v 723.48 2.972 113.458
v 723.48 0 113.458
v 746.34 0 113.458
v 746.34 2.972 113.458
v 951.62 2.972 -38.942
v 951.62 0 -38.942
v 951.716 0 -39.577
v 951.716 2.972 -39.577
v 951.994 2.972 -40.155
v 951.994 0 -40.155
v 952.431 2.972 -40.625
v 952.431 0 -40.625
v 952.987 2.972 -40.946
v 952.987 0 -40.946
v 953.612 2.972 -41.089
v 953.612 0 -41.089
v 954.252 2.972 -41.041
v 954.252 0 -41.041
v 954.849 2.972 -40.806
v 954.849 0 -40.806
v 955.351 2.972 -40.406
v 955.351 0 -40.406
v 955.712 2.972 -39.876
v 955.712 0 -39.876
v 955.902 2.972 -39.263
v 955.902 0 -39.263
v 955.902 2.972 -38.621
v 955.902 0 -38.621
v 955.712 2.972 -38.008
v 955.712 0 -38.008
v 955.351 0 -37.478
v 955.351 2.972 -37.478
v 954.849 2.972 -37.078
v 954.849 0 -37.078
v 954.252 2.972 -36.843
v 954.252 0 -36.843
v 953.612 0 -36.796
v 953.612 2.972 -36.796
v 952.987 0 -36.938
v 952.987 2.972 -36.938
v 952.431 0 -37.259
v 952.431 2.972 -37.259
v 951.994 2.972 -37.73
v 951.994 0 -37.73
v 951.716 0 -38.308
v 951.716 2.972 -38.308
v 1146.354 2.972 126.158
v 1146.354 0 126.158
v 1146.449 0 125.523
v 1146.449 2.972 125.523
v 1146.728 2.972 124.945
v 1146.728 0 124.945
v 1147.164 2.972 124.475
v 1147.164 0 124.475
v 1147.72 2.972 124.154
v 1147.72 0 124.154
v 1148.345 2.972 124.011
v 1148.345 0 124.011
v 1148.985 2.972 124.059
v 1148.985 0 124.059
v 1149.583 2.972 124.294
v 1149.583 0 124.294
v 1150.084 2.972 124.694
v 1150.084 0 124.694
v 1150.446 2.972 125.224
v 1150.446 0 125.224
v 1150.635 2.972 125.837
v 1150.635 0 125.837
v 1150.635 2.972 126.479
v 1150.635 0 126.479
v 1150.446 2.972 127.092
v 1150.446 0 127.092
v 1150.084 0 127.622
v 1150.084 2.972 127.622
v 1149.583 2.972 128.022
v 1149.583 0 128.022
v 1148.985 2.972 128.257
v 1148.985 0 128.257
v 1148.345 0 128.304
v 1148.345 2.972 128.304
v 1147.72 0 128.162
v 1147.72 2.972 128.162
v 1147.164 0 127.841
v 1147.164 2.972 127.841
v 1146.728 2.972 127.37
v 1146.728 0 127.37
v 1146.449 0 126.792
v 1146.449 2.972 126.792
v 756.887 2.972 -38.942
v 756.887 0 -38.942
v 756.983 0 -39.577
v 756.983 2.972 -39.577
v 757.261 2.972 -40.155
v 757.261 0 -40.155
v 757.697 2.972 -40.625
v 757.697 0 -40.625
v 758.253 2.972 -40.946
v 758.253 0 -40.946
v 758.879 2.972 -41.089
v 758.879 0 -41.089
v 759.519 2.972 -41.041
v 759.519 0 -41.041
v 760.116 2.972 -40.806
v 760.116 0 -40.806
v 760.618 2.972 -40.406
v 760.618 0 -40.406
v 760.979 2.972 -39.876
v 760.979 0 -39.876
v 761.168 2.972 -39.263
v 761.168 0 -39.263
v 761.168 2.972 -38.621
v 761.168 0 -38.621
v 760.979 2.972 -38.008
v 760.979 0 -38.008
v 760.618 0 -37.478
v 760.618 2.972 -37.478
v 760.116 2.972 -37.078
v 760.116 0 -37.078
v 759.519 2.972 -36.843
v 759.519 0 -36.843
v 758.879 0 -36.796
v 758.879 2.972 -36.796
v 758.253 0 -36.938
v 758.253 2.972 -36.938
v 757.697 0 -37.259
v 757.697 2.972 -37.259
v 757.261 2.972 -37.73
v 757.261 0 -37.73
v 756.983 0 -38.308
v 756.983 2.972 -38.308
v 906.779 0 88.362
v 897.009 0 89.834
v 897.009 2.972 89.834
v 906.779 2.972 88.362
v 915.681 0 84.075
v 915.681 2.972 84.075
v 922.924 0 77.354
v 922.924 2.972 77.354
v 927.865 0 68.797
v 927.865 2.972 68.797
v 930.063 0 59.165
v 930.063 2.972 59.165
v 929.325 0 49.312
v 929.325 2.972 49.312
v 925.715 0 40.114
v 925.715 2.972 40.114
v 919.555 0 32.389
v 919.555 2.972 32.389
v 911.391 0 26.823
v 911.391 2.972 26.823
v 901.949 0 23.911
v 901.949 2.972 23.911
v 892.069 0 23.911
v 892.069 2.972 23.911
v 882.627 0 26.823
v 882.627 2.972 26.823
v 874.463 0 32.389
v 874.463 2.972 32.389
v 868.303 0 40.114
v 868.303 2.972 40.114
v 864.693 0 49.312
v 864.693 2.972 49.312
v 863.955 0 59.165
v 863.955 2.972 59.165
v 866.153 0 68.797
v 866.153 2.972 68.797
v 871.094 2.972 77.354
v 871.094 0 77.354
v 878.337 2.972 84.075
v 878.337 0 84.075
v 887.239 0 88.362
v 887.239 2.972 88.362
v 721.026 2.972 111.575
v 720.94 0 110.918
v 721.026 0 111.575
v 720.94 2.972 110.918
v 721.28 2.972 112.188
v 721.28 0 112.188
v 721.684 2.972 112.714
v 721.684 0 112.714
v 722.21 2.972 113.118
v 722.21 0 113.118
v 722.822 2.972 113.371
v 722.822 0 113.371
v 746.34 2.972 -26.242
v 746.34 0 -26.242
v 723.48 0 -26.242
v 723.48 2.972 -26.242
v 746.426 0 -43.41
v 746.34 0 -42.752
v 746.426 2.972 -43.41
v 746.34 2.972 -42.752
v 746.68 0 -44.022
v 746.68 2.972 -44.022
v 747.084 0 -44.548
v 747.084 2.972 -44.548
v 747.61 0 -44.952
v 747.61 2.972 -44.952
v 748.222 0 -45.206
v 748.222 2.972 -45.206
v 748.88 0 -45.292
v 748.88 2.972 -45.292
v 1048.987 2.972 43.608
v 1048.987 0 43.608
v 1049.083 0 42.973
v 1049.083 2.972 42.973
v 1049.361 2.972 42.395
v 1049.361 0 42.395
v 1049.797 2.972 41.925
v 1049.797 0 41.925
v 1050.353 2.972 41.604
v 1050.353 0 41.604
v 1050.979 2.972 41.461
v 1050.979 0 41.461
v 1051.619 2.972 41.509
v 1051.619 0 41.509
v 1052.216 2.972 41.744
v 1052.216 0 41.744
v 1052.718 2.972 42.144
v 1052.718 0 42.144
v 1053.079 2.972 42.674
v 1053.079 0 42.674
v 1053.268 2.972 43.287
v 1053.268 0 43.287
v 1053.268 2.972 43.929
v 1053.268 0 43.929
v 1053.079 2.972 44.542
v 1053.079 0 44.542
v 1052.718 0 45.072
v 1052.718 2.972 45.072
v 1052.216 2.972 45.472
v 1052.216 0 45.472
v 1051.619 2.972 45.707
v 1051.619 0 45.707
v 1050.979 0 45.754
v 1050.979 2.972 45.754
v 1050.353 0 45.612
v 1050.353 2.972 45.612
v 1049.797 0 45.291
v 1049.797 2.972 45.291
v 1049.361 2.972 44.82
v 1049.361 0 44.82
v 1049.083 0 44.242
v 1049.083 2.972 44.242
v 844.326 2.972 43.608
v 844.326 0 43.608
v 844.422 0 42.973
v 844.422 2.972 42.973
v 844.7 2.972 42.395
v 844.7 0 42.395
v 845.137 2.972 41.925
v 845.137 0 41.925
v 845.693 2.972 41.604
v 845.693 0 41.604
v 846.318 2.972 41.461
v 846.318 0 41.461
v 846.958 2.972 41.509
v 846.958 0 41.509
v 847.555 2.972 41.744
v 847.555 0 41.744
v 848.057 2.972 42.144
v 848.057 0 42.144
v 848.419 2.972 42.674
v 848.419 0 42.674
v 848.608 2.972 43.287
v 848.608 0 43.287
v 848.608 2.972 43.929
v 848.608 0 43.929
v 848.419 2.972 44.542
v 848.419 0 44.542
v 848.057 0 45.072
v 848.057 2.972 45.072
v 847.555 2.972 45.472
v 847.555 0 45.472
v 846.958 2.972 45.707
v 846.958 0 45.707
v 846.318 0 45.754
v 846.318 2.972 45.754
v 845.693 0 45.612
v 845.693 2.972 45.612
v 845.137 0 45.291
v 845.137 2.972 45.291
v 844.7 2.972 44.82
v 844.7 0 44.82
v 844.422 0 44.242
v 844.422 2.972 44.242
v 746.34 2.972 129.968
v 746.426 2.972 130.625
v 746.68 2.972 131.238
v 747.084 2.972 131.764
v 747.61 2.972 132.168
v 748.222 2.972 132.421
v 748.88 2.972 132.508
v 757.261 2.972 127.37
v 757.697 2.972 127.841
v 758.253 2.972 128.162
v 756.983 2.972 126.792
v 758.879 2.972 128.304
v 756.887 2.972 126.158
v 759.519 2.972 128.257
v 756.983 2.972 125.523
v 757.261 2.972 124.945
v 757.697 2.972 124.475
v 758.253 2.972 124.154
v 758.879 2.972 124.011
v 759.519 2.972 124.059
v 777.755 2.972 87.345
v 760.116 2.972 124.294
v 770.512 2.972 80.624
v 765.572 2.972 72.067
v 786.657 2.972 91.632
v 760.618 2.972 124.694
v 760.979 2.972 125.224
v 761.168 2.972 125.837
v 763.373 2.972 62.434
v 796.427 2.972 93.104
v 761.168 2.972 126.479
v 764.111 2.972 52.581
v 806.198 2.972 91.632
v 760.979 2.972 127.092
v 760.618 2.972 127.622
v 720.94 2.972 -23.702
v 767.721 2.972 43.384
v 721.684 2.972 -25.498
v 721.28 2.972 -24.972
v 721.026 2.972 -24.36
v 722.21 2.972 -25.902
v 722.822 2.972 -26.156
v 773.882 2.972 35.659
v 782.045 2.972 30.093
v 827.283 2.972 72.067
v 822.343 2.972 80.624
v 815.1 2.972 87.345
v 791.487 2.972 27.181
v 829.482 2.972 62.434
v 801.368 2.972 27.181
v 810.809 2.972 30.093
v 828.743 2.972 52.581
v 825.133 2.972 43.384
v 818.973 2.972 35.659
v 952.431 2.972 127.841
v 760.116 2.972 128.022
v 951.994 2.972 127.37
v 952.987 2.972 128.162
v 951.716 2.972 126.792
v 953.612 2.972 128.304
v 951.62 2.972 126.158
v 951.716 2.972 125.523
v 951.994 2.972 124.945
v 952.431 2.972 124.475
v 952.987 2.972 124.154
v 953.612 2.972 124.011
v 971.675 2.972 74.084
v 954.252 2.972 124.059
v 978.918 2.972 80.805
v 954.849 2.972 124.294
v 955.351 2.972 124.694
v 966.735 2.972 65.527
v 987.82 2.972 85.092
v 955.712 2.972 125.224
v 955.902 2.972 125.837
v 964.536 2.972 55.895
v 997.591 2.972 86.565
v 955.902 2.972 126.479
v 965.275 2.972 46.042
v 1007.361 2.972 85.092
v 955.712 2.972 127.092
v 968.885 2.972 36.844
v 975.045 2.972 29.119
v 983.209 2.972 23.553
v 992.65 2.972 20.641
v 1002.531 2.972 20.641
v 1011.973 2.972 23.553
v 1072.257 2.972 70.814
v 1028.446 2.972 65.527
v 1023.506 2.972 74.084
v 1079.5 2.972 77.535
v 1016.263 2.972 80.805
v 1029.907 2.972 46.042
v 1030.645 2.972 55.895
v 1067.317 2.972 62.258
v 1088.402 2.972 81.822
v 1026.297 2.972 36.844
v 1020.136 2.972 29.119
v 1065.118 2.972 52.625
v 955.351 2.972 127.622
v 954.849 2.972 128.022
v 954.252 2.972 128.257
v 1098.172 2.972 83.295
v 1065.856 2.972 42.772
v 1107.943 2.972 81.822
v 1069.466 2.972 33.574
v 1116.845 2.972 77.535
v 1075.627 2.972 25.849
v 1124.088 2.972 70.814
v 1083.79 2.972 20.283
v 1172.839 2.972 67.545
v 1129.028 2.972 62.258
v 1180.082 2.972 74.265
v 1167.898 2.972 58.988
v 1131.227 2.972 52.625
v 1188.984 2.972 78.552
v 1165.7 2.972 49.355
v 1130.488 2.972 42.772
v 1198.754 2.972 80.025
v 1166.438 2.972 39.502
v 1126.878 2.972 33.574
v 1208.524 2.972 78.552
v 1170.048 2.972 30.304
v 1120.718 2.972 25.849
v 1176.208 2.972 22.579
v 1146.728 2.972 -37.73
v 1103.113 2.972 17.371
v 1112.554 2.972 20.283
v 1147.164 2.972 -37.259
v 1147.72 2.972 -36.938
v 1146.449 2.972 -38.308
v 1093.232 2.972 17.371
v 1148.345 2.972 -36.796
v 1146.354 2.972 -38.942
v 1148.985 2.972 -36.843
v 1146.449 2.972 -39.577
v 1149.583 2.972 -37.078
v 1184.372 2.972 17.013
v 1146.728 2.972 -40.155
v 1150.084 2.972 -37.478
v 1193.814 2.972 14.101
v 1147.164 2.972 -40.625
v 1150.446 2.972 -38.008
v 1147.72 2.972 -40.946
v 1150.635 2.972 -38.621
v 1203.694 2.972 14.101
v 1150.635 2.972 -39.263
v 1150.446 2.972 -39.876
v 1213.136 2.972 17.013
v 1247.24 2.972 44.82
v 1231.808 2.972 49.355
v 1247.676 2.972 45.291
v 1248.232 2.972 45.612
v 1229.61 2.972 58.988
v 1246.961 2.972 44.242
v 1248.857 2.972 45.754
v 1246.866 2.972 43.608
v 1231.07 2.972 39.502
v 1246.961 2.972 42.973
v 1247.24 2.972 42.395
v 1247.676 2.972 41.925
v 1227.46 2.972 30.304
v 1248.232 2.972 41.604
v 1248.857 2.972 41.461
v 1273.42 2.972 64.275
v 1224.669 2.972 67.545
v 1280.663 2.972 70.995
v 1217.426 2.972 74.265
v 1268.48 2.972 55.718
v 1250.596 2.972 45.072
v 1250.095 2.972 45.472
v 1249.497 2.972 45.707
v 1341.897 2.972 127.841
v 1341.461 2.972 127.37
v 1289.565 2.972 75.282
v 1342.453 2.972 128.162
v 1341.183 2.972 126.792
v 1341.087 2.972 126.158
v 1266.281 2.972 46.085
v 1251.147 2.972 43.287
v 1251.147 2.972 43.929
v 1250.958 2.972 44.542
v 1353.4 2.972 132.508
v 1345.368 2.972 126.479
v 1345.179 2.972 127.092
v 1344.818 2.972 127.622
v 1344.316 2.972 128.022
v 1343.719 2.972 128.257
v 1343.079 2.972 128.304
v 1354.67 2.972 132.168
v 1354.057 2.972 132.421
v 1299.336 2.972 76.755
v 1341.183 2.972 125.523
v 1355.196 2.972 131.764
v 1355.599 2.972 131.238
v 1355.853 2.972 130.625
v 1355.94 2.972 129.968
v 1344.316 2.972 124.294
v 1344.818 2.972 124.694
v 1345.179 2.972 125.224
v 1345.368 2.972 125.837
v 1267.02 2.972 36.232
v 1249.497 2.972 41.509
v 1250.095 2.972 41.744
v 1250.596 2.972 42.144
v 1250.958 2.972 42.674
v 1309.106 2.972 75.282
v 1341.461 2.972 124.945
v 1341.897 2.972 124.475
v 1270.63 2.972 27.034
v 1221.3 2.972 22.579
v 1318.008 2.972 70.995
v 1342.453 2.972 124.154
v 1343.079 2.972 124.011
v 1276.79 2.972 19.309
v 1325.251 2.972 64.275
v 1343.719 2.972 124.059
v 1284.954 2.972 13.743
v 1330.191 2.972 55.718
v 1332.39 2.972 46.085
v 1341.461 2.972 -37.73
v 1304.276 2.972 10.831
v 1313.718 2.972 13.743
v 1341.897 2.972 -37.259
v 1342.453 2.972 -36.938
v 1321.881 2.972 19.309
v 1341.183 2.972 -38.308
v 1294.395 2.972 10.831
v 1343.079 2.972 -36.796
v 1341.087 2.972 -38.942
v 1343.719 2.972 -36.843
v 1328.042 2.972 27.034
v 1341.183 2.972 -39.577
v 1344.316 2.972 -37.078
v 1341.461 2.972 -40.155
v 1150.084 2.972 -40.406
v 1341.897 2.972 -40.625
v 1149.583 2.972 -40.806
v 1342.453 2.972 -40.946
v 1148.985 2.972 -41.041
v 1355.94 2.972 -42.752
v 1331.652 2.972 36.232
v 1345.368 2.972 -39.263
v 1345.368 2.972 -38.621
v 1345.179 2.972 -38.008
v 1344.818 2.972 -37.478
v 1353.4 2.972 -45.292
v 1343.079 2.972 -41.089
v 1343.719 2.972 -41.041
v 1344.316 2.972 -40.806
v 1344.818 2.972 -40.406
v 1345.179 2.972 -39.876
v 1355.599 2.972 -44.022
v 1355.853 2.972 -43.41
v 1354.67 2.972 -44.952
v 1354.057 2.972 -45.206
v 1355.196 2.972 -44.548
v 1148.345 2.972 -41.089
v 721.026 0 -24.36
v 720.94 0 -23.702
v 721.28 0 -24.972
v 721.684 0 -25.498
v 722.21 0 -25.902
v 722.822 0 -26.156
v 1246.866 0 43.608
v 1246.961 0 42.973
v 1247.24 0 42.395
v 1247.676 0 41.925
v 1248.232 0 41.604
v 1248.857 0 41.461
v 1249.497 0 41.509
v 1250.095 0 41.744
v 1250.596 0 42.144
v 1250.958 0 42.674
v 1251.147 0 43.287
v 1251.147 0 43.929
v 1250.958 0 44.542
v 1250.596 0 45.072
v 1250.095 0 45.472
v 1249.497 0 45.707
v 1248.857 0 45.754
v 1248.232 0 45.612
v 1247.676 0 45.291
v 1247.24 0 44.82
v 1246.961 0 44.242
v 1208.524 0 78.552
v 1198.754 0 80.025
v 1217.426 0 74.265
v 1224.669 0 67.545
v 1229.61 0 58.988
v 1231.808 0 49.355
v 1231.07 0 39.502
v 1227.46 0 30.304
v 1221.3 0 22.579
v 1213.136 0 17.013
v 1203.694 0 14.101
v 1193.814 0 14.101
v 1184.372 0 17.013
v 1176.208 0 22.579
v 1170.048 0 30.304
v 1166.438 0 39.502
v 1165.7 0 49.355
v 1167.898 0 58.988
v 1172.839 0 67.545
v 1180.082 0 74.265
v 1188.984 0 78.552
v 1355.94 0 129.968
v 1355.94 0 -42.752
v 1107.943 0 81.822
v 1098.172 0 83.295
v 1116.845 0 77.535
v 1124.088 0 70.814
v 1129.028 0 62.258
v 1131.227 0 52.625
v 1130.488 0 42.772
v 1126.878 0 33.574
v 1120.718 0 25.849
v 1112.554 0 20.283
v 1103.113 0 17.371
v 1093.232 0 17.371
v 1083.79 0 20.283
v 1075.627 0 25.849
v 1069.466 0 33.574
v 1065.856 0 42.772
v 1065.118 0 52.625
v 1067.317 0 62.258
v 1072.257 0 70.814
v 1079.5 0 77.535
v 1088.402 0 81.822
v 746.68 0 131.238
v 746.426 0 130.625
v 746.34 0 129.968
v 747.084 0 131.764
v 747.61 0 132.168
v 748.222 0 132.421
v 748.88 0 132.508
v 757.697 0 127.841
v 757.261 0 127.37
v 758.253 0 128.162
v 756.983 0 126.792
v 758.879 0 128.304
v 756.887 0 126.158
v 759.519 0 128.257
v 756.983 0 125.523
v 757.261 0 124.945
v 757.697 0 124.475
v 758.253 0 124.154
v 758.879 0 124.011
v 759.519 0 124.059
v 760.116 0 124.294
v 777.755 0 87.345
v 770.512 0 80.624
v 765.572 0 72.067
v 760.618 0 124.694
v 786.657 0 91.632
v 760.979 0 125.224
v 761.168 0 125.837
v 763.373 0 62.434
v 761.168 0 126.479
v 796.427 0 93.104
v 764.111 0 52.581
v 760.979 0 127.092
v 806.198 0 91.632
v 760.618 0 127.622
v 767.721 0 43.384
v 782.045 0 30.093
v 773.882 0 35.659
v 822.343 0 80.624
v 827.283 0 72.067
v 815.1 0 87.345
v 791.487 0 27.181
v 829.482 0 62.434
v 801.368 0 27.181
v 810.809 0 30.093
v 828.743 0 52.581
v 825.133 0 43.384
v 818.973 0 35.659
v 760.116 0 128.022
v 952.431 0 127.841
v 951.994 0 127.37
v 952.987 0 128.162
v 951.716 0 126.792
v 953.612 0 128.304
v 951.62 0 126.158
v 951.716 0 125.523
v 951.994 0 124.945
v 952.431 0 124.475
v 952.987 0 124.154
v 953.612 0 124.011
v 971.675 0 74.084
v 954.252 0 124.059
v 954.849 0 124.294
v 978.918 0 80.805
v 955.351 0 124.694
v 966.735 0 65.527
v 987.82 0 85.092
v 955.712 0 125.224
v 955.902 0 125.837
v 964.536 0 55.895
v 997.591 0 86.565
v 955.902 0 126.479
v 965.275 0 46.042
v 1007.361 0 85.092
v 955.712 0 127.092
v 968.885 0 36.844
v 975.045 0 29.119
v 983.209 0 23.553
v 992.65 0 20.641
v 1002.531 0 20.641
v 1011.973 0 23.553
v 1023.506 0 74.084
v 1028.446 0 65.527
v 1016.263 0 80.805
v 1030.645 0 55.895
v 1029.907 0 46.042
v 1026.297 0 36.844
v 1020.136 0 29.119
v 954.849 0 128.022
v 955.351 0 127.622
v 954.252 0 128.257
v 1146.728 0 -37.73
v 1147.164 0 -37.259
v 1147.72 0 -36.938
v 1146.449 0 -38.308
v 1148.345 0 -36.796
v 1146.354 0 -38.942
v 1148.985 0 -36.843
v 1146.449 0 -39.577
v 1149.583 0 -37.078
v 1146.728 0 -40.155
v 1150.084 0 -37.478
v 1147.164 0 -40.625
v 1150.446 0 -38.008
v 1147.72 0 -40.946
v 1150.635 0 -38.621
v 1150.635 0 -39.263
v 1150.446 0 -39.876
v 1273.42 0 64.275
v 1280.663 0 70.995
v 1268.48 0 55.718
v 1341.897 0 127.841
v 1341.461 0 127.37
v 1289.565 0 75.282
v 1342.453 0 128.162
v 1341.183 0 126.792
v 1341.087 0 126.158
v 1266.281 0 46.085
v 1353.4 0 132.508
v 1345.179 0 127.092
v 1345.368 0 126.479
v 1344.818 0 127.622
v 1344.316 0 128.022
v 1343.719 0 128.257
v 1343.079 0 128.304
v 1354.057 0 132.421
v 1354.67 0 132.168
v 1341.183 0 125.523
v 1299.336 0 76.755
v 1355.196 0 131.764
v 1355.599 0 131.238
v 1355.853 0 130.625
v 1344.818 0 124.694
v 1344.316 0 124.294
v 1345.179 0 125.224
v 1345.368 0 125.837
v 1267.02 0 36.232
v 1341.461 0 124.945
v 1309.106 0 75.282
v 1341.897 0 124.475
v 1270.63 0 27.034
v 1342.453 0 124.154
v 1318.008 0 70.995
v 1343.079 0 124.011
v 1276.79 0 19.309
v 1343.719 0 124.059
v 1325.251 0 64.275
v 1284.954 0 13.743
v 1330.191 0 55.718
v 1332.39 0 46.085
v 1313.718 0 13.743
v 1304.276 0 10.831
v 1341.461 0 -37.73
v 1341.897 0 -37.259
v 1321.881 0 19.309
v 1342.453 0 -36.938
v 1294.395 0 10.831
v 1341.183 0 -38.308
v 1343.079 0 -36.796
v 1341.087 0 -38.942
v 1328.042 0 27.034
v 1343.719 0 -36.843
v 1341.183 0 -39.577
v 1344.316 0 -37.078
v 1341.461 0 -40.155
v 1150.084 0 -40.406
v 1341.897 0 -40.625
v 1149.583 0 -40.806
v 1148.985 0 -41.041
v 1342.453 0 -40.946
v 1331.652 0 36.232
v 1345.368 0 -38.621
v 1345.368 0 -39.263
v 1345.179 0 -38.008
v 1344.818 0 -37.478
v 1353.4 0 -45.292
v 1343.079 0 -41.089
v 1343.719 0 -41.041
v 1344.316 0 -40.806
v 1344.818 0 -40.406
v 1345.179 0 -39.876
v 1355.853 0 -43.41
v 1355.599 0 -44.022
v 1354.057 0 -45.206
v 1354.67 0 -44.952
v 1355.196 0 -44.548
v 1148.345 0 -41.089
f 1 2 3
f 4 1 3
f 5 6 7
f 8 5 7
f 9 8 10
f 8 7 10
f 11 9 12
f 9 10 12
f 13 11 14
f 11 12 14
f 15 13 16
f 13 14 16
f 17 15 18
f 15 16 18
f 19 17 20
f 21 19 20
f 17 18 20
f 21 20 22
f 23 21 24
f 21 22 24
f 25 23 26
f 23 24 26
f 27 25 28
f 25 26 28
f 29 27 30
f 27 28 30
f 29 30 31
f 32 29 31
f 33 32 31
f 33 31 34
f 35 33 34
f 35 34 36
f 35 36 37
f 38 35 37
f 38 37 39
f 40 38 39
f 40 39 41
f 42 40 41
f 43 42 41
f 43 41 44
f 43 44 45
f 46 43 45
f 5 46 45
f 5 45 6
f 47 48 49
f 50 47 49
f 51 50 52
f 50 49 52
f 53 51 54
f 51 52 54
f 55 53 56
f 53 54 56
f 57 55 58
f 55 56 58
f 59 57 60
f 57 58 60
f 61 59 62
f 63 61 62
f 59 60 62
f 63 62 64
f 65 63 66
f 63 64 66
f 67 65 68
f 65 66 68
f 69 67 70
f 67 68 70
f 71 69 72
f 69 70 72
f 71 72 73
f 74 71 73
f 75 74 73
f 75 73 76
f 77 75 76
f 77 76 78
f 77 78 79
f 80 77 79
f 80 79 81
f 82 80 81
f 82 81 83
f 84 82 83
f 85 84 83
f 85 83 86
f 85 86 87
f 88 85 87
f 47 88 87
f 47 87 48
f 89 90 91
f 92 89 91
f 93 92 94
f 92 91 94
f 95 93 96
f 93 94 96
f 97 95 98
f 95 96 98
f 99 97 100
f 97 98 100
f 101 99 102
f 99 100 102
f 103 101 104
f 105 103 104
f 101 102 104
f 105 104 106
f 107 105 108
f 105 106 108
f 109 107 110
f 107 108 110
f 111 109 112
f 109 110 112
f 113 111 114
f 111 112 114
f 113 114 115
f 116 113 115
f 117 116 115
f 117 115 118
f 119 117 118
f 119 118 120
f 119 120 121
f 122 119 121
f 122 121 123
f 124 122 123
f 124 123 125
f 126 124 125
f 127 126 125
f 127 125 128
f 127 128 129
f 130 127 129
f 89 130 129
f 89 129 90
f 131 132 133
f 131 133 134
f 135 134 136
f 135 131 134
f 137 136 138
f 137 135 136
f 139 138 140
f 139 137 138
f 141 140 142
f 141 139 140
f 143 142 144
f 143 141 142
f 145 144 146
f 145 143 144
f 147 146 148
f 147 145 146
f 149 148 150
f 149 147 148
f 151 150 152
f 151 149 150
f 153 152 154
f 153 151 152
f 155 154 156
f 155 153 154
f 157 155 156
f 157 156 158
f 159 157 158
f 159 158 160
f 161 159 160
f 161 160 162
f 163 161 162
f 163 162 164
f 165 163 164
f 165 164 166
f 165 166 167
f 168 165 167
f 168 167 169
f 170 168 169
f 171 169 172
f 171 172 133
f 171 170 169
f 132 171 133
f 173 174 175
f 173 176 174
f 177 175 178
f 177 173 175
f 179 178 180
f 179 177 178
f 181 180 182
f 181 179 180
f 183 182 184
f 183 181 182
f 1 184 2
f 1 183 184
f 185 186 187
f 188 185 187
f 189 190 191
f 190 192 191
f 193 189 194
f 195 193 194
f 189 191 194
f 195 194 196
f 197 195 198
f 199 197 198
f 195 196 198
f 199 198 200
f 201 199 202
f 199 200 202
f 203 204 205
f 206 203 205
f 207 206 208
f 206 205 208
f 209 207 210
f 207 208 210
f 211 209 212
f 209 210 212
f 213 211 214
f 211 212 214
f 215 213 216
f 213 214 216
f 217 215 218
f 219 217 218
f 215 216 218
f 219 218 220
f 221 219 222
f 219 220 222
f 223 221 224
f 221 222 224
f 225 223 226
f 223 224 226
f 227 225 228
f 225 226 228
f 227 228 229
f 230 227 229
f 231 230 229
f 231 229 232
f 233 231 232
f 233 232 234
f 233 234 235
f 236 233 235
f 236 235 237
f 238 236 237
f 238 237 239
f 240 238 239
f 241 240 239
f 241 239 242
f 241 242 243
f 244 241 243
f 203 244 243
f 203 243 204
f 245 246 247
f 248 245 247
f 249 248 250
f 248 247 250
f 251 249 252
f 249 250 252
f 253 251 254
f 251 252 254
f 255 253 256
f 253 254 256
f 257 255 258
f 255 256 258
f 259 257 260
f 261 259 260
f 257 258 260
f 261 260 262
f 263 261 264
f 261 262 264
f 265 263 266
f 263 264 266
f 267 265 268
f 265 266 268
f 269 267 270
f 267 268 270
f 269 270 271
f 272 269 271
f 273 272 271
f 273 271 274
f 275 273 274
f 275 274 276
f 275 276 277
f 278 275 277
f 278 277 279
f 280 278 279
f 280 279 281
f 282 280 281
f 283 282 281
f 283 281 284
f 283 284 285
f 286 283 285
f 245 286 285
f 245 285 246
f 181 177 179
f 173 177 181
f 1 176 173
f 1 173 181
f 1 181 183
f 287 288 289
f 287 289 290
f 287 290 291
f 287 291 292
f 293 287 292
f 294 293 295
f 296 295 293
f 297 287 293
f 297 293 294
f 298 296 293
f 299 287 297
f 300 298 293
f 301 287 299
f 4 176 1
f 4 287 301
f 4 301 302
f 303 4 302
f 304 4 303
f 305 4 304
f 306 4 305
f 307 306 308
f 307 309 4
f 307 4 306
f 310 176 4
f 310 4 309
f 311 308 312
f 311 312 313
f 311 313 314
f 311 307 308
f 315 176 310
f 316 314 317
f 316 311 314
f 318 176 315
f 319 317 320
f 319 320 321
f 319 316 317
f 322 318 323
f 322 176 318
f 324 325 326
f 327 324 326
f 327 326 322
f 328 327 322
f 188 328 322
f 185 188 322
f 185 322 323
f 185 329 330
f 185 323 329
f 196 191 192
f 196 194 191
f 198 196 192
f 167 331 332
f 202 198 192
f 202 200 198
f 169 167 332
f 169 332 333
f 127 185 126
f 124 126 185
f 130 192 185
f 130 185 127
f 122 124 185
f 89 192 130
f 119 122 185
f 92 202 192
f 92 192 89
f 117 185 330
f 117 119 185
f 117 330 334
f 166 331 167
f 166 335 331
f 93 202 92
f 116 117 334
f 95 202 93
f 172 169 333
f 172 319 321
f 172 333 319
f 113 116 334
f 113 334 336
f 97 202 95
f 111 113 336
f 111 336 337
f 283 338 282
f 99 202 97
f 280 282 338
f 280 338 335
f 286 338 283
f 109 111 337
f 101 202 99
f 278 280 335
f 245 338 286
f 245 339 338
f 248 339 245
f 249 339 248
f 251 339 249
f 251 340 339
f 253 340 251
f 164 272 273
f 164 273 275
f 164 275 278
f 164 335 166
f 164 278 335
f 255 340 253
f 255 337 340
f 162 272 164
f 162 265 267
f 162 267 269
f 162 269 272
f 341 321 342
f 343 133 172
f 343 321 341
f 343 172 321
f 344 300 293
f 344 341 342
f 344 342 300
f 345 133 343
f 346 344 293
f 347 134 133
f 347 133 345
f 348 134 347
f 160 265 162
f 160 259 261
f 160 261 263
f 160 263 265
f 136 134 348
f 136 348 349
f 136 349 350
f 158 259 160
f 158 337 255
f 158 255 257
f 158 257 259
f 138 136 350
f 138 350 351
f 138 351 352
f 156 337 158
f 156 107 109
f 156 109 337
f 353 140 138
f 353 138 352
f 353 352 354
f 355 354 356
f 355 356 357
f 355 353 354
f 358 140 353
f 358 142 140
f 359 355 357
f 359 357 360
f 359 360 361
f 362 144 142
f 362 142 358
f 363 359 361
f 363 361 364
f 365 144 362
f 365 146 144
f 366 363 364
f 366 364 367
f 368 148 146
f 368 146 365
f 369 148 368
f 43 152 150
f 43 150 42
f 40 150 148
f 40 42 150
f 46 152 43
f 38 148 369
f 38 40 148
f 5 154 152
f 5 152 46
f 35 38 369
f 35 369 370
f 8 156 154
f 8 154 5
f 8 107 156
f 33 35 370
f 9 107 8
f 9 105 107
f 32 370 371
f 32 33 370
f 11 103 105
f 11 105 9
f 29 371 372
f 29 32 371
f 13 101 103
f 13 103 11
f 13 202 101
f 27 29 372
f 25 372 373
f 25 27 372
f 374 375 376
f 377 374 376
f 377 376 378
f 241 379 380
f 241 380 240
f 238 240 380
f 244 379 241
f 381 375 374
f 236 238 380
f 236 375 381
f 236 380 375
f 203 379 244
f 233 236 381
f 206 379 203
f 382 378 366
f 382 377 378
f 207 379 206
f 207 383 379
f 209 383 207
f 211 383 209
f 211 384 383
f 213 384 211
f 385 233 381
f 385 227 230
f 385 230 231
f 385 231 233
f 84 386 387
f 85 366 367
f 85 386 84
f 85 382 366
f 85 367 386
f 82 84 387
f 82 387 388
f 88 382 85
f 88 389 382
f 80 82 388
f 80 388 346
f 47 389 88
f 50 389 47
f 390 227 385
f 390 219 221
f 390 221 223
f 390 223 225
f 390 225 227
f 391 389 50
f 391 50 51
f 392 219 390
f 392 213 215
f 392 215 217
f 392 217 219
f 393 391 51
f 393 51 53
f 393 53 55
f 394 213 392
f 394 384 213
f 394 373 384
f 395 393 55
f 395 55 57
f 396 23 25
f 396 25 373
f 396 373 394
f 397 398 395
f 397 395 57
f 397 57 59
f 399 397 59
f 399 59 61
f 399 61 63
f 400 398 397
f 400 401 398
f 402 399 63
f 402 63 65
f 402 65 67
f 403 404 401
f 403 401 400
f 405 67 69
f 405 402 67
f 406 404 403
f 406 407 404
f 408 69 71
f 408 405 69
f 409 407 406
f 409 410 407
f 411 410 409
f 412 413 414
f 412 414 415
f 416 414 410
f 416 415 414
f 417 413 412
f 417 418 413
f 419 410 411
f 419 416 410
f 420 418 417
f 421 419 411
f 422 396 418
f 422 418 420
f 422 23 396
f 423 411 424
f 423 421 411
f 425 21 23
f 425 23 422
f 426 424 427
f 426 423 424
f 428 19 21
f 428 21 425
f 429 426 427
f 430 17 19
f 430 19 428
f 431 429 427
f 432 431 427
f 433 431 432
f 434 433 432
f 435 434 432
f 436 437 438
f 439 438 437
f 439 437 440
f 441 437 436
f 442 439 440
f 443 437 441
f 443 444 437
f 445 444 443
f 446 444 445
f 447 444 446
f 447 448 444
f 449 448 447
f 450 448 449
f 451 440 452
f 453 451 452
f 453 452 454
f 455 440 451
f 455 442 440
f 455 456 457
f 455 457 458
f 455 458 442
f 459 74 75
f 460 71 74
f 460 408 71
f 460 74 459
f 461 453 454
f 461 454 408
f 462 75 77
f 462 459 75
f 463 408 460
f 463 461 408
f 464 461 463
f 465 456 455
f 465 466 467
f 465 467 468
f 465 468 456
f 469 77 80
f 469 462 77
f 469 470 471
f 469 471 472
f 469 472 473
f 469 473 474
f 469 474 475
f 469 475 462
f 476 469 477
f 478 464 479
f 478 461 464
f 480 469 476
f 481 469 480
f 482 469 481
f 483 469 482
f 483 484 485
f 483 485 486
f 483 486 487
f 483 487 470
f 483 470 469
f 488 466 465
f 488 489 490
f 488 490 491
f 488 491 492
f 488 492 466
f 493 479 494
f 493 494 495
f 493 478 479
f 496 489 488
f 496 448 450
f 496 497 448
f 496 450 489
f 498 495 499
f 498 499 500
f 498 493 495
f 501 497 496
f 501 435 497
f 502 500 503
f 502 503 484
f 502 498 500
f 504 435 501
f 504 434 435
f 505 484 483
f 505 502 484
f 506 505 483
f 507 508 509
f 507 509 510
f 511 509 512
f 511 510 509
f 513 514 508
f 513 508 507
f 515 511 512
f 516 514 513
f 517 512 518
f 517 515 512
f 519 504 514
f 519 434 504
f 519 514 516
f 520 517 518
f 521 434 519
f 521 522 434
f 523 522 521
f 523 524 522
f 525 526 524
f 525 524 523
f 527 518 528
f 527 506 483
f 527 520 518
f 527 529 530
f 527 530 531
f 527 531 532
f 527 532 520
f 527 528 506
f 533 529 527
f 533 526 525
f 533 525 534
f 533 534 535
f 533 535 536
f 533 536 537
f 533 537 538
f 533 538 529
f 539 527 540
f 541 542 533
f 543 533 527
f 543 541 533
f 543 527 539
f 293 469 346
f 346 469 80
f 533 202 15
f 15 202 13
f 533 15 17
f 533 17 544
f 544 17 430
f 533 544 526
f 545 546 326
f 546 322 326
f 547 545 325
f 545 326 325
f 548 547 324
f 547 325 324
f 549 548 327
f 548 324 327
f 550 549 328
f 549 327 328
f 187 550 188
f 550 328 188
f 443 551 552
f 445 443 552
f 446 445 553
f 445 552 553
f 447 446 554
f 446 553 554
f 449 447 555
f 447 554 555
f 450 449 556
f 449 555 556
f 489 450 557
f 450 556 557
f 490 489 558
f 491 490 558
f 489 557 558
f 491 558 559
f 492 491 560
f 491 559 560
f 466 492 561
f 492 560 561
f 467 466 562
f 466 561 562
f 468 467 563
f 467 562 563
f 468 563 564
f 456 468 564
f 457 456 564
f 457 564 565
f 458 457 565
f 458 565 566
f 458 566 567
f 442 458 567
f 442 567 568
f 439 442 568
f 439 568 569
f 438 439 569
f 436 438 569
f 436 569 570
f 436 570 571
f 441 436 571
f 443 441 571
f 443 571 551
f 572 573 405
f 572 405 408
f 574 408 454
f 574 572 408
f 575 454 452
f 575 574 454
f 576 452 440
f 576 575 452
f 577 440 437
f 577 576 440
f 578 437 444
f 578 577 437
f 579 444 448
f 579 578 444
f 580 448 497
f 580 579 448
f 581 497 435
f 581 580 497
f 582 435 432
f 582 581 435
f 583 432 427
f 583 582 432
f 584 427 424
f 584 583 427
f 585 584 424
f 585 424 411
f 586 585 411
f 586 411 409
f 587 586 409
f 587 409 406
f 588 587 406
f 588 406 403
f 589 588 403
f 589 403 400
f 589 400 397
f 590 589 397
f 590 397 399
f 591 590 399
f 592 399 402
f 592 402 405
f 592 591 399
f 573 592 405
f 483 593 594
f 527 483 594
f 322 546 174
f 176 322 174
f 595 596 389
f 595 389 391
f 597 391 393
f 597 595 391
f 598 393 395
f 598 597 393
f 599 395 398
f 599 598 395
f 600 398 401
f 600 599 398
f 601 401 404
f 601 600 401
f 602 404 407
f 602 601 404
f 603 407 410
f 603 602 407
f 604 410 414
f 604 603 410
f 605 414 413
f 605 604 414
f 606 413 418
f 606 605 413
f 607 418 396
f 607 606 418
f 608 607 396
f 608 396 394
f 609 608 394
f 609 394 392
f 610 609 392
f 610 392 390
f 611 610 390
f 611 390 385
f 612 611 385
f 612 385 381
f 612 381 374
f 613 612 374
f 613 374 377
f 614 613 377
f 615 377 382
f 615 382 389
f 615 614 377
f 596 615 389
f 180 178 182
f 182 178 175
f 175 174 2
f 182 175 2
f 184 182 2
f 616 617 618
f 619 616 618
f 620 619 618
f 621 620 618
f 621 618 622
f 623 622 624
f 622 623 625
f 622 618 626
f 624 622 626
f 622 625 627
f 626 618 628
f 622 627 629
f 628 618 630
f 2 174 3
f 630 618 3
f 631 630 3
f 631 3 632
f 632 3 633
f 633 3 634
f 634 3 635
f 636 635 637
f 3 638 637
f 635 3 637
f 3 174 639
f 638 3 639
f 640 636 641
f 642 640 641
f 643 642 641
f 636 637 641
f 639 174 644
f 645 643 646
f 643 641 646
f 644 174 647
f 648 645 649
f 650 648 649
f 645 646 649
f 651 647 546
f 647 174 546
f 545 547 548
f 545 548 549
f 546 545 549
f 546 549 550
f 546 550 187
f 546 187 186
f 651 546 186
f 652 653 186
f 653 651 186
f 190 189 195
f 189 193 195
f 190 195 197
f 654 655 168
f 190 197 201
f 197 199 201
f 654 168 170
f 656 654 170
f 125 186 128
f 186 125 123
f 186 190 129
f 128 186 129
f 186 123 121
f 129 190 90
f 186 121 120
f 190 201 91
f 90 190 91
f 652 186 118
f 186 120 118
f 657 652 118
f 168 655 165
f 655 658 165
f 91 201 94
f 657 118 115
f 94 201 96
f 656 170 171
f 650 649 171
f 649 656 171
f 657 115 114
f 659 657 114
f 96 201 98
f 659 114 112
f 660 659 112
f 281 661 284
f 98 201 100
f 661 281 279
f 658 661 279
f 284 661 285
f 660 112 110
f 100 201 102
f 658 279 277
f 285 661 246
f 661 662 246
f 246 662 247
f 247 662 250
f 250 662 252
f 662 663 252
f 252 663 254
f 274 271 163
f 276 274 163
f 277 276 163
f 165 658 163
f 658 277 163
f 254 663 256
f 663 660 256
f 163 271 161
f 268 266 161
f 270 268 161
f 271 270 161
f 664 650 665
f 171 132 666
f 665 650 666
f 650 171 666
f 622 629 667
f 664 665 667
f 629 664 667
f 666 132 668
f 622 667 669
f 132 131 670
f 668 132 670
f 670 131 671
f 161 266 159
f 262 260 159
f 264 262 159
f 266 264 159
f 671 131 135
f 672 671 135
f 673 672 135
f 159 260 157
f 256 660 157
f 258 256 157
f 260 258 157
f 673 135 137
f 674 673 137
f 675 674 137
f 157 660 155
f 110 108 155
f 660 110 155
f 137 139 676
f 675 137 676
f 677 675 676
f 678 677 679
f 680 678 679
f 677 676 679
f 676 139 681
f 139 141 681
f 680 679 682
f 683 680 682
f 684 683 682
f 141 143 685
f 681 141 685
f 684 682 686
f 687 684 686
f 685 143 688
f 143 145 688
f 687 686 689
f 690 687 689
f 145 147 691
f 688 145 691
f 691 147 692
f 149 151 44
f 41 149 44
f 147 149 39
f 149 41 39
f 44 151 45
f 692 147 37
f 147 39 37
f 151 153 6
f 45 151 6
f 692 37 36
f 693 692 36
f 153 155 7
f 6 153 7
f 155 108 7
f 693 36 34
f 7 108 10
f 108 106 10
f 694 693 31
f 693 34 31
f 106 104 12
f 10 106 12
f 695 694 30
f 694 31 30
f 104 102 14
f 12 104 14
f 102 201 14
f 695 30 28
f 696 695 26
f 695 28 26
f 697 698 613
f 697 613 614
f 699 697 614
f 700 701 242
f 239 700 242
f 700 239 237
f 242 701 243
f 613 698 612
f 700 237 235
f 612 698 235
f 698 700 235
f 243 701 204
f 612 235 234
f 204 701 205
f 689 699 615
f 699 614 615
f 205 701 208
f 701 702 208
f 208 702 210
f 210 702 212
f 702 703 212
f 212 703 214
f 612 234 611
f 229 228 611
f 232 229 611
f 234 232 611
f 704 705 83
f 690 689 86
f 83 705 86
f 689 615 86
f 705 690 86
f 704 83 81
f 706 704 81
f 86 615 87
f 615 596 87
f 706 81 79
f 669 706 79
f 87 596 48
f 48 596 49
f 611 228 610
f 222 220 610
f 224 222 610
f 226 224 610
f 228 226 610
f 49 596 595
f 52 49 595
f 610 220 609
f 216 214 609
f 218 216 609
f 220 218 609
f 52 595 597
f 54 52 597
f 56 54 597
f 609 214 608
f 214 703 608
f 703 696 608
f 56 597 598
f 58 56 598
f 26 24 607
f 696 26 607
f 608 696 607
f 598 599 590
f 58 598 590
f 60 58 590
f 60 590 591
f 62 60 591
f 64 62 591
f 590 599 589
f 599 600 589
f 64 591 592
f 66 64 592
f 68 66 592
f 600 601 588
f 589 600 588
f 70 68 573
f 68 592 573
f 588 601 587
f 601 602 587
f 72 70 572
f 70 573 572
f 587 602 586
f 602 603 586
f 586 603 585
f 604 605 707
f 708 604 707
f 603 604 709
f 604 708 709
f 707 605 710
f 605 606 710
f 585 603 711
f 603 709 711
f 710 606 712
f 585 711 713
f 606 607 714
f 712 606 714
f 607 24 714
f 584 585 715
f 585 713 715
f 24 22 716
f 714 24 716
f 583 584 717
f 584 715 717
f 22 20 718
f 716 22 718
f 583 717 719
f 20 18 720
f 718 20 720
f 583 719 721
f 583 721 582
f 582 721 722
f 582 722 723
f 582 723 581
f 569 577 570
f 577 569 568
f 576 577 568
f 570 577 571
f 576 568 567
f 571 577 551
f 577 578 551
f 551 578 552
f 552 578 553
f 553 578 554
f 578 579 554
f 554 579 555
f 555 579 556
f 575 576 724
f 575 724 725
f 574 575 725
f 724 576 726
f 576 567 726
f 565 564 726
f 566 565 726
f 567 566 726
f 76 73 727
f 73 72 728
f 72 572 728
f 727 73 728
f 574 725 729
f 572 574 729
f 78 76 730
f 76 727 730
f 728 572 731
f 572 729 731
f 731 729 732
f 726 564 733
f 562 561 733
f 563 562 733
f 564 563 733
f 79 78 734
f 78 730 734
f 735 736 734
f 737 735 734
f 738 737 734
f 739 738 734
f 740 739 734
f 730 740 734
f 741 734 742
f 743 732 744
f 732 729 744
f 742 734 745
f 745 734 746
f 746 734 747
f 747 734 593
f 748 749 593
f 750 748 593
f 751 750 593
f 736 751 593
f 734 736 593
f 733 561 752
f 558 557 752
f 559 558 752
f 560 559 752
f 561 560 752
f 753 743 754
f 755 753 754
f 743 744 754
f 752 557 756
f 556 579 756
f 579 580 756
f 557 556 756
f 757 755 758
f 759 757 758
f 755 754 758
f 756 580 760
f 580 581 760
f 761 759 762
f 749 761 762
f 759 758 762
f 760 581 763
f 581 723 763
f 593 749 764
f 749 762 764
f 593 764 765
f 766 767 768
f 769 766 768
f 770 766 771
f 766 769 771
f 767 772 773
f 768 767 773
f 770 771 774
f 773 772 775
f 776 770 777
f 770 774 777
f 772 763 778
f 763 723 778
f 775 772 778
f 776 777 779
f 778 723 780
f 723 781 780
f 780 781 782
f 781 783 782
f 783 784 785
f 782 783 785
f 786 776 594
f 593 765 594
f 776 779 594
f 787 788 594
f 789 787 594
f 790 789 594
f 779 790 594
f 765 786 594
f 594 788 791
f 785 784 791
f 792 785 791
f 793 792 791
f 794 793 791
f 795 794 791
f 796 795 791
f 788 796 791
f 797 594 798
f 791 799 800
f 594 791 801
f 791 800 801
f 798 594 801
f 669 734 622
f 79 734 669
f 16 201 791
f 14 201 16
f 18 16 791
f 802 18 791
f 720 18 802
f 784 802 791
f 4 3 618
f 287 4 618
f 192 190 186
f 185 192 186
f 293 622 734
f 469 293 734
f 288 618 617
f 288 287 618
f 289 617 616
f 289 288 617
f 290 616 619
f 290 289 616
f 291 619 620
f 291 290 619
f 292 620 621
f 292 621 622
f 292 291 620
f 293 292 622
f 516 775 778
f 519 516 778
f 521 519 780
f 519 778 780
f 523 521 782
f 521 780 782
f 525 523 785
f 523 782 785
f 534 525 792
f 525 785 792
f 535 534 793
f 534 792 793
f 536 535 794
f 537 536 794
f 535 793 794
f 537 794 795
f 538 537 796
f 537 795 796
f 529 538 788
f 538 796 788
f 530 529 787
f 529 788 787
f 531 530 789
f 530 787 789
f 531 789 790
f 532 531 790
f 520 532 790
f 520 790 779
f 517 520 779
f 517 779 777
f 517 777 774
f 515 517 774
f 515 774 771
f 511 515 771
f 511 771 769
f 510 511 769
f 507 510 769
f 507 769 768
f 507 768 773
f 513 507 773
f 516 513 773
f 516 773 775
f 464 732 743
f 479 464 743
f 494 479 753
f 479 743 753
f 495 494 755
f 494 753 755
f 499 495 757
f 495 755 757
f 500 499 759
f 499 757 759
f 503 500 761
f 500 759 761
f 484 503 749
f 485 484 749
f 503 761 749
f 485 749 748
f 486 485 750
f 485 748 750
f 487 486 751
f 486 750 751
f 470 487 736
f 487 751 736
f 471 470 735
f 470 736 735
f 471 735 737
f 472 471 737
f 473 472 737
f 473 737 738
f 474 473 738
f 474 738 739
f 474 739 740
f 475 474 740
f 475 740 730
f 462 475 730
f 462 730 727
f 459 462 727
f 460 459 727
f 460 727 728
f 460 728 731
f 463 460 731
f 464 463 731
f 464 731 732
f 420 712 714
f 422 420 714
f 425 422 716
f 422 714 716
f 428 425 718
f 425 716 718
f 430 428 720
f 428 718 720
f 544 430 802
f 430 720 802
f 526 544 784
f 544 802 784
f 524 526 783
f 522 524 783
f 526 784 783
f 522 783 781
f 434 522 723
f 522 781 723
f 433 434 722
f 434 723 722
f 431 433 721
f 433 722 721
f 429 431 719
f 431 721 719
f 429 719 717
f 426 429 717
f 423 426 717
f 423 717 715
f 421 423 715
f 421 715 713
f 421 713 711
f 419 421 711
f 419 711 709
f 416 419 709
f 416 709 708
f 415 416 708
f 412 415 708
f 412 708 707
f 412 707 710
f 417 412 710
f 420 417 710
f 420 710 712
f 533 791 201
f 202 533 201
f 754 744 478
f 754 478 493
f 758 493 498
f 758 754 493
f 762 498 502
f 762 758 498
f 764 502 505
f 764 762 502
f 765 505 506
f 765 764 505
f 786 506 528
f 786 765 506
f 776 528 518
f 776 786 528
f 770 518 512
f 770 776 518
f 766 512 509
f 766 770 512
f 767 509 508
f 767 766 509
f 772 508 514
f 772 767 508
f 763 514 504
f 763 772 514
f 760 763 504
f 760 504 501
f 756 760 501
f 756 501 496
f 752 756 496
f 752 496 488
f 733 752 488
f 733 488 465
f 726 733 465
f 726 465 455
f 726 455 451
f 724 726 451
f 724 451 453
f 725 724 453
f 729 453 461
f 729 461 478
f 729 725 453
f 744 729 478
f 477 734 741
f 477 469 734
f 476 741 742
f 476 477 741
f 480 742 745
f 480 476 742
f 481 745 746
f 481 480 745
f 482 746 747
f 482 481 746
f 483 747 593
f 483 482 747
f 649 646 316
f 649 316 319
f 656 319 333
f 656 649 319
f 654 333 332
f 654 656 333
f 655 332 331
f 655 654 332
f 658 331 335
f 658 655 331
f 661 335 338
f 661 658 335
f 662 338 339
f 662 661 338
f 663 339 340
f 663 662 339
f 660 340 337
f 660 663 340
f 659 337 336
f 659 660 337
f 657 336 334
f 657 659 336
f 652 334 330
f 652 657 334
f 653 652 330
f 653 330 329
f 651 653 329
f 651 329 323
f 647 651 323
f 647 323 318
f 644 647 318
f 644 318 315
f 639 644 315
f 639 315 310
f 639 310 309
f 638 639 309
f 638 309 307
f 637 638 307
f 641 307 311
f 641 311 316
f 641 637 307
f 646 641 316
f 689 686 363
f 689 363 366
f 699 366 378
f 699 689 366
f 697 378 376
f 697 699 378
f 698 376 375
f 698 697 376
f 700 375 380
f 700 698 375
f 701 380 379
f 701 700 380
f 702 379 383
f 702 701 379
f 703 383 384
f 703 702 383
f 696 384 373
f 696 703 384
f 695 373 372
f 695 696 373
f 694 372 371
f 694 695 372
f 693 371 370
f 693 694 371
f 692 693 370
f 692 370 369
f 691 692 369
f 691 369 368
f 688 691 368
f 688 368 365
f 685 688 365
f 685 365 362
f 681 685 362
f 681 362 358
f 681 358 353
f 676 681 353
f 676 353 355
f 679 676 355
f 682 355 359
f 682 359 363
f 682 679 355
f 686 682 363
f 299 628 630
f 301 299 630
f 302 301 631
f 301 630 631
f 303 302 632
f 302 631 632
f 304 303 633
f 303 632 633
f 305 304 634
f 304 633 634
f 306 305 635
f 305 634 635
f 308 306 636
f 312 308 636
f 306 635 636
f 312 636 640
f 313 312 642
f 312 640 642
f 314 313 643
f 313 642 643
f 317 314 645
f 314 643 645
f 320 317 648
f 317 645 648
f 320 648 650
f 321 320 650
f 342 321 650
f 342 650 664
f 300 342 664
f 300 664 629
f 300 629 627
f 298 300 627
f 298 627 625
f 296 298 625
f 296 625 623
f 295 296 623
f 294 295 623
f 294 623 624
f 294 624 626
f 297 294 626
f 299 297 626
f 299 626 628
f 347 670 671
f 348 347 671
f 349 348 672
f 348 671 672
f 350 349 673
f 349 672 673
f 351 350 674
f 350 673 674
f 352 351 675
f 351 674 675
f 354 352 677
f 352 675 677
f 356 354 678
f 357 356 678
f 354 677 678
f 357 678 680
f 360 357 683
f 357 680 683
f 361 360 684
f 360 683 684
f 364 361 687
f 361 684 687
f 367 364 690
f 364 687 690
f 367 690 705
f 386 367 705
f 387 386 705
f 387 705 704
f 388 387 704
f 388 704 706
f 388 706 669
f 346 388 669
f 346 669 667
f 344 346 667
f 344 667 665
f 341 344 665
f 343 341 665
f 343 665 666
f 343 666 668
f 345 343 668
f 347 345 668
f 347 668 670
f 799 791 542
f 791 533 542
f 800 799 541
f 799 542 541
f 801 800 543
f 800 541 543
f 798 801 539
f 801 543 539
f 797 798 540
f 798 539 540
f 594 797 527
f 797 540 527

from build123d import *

# Parameters (mm, degrees)
SKETCH1_R             = 33.147
BOSS_EXTRUDE1_DEPTH   = 2.9718
F_8_CLEARANCE_HOLE1_D = 4.3053
FILLET1_R             = 2.54


with BuildPart() as part:
    # Sketch1 → Boss-Extrude1 (new body)
    with BuildSketch(Plane(origin=(0, 0, 0), x_dir=(1, 0, 0), z_dir=(0, 1, 0))):
        Polygon((720.939652548, 26.242162499), (720.939652548, -113.457837501), (746.339652548, -113.457837501), (746.339652548, -132.507837501), (1355.939652548, -132.507837501), (1355.939652548, 45.292162499), (746.339652548, 45.292162499), (746.339652548, 26.242162499), align=None)
        with Locations(Location((1299.335652548, -43.607837501, 0), (0, 0, 270))):
            Circle(SKETCH1_R, mode=Mode.SUBTRACT)
        with Locations(Location((1198.753990482, -46.877734612, 0), (0, 0, 270))):
            Circle(SKETCH1_R, mode=Mode.SUBTRACT)
        with Locations(Location((1098.172328416, -50.147631723, 0), (0, 0, 270))):
            Circle(SKETCH1_R, mode=Mode.SUBTRACT)
        with Locations(Location((997.59066635, -53.417528834, 0), (0, 0, 270))):
            Circle(SKETCH1_R, mode=Mode.SUBTRACT)
        with Locations(Location((897.009004284, -56.687425945, 0), (0, 0, 270))):
            Circle(SKETCH1_R, mode=Mode.SUBTRACT)
        with Locations(Location((796.427342219, -59.957323056, 0), (0, 0, 270))):
            Circle(SKETCH1_R, mode=Mode.SUBTRACT)
    extrude(amount=BOSS_EXTRUDE1_DEPTH)

    # #8 Clearance Hole1 (through all)
    with Locations(Plane(origin=(0, 2.9718, 0), x_dir=(1, 0, 0), z_dir=(0, 1, 0))):
        with Locations((759.039652548, 38.942162499), (759.039652548, -126.157837501), (953.772985881, -126.157837501), (953.772985881, 38.942162499), (1148.506319214, 38.942162499), (1148.506319214, -126.157837501), (1343.239652548, -126.157837501), (1343.239652548, 38.942162499), (1249.018252548, -43.607837501), (1051.139652548, -43.607837501), (846.479052548, -43.607837501)):
            Hole(F_8_CLEARANCE_HOLE1_D / 2)

    # Fillet1
    fillet1_edges = [part.edges().sort_by_distance(p)[0] for p in [
        (746.339652548, 1.4859, 132.507837501),
        (720.939652548, 1.4859, 113.457837501),
        (720.939652548, 1.4859, -26.242162499),
        (746.339652548, 1.4859, -45.292162499),
        (1355.939652548, 1.4859, -45.292162499),
        (1355.939652548, 1.4859, 132.507837501),
    ]]
    fillet(fillet1_edges, radius=FILLET1_R)


solid = part.part
